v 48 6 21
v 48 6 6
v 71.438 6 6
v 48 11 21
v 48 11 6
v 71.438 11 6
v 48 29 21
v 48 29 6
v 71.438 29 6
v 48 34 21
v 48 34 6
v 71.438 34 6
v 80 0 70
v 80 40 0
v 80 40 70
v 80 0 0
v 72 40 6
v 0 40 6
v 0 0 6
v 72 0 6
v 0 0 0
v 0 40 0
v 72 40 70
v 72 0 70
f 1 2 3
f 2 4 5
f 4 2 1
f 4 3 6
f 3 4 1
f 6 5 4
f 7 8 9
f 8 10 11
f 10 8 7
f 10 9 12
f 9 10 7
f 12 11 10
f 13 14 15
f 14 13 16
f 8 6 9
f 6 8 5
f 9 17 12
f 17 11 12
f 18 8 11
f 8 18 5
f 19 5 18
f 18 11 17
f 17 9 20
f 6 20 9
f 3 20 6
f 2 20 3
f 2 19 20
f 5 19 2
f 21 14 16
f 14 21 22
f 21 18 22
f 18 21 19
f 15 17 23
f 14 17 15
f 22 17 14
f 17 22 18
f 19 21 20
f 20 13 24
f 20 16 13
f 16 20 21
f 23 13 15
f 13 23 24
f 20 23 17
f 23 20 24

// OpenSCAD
$fn = 32;

// ----------------------------------------------------------------------
// Rib bracket: 2-gusset L bracket
// ----------------------------------------------------------------------

// --- parameters (mm) ---
base_l = 80;              // foot length, X
base_w = 40;              // foot width, Y
base_t = 6;               // foot thickness
plate_t = 8;              // upright plate thickness
plate_h = 70;             // overall height
gus_l = 24;               // gusset leg along the foot
gus_h = 16;               // gusset height
gus_t = 5;                // gusset thickness
gus_edge = 6;             // gusset margin from the foot edge
n_gus = 2;                // gusset count

gus_pitch = (base_w - 2 * gus_edge - gus_t) / (n_gus - 1);  // gusset pitch

union() {
  cube([base_l, base_w, base_t]);
  translate([base_l - plate_t, 0, base_t - 1])
    cube([plate_t, base_w, plate_h - base_t + 1]);
  for (i = [0 : n_gus - 1])
    translate([base_l - plate_t - gus_l, gus_edge + i * gus_pitch, base_t - 1])
      rotate([-90, 0, 0])
        linear_extrude(height = gus_t)
          polygon(points = [[0, 0], [gus_l + 1, 0], [0, -gus_h]]);
}
